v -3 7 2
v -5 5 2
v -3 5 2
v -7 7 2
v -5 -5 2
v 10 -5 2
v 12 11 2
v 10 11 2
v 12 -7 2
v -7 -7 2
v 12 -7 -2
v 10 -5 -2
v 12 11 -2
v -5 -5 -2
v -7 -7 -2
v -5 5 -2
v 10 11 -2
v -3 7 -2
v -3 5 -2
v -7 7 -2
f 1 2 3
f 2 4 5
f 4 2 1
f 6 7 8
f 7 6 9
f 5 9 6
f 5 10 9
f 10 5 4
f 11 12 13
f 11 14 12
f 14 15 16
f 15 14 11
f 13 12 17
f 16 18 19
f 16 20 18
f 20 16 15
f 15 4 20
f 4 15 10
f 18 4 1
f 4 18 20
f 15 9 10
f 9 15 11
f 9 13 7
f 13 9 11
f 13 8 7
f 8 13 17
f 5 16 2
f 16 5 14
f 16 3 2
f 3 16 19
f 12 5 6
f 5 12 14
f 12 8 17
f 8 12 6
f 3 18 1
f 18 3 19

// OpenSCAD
ROD=10;
PLY=5;
OFFSET=0;
THICKNESS=4;
difference(){
    union(){
        cube([ROD+4,ROD+4,THICKNESS],center=true);
        translate([(ROD+PLY)/2,-OFFSET/2+2,0])
            cube([PLY+4,ROD+OFFSET+8,THICKNESS],center=true);
    };
    union(){
        cube([ROD,ROD,THICKNESS],center=true);
        translate([(ROD+PLY)/2,-OFFSET/2+4,0])
            cube([PLY,ROD+OFFSET+8,THICKNESS],center=true);
        translate([2,6,0])
            cube([ROD,ROD,THICKNESS],center=true);
    };
};
